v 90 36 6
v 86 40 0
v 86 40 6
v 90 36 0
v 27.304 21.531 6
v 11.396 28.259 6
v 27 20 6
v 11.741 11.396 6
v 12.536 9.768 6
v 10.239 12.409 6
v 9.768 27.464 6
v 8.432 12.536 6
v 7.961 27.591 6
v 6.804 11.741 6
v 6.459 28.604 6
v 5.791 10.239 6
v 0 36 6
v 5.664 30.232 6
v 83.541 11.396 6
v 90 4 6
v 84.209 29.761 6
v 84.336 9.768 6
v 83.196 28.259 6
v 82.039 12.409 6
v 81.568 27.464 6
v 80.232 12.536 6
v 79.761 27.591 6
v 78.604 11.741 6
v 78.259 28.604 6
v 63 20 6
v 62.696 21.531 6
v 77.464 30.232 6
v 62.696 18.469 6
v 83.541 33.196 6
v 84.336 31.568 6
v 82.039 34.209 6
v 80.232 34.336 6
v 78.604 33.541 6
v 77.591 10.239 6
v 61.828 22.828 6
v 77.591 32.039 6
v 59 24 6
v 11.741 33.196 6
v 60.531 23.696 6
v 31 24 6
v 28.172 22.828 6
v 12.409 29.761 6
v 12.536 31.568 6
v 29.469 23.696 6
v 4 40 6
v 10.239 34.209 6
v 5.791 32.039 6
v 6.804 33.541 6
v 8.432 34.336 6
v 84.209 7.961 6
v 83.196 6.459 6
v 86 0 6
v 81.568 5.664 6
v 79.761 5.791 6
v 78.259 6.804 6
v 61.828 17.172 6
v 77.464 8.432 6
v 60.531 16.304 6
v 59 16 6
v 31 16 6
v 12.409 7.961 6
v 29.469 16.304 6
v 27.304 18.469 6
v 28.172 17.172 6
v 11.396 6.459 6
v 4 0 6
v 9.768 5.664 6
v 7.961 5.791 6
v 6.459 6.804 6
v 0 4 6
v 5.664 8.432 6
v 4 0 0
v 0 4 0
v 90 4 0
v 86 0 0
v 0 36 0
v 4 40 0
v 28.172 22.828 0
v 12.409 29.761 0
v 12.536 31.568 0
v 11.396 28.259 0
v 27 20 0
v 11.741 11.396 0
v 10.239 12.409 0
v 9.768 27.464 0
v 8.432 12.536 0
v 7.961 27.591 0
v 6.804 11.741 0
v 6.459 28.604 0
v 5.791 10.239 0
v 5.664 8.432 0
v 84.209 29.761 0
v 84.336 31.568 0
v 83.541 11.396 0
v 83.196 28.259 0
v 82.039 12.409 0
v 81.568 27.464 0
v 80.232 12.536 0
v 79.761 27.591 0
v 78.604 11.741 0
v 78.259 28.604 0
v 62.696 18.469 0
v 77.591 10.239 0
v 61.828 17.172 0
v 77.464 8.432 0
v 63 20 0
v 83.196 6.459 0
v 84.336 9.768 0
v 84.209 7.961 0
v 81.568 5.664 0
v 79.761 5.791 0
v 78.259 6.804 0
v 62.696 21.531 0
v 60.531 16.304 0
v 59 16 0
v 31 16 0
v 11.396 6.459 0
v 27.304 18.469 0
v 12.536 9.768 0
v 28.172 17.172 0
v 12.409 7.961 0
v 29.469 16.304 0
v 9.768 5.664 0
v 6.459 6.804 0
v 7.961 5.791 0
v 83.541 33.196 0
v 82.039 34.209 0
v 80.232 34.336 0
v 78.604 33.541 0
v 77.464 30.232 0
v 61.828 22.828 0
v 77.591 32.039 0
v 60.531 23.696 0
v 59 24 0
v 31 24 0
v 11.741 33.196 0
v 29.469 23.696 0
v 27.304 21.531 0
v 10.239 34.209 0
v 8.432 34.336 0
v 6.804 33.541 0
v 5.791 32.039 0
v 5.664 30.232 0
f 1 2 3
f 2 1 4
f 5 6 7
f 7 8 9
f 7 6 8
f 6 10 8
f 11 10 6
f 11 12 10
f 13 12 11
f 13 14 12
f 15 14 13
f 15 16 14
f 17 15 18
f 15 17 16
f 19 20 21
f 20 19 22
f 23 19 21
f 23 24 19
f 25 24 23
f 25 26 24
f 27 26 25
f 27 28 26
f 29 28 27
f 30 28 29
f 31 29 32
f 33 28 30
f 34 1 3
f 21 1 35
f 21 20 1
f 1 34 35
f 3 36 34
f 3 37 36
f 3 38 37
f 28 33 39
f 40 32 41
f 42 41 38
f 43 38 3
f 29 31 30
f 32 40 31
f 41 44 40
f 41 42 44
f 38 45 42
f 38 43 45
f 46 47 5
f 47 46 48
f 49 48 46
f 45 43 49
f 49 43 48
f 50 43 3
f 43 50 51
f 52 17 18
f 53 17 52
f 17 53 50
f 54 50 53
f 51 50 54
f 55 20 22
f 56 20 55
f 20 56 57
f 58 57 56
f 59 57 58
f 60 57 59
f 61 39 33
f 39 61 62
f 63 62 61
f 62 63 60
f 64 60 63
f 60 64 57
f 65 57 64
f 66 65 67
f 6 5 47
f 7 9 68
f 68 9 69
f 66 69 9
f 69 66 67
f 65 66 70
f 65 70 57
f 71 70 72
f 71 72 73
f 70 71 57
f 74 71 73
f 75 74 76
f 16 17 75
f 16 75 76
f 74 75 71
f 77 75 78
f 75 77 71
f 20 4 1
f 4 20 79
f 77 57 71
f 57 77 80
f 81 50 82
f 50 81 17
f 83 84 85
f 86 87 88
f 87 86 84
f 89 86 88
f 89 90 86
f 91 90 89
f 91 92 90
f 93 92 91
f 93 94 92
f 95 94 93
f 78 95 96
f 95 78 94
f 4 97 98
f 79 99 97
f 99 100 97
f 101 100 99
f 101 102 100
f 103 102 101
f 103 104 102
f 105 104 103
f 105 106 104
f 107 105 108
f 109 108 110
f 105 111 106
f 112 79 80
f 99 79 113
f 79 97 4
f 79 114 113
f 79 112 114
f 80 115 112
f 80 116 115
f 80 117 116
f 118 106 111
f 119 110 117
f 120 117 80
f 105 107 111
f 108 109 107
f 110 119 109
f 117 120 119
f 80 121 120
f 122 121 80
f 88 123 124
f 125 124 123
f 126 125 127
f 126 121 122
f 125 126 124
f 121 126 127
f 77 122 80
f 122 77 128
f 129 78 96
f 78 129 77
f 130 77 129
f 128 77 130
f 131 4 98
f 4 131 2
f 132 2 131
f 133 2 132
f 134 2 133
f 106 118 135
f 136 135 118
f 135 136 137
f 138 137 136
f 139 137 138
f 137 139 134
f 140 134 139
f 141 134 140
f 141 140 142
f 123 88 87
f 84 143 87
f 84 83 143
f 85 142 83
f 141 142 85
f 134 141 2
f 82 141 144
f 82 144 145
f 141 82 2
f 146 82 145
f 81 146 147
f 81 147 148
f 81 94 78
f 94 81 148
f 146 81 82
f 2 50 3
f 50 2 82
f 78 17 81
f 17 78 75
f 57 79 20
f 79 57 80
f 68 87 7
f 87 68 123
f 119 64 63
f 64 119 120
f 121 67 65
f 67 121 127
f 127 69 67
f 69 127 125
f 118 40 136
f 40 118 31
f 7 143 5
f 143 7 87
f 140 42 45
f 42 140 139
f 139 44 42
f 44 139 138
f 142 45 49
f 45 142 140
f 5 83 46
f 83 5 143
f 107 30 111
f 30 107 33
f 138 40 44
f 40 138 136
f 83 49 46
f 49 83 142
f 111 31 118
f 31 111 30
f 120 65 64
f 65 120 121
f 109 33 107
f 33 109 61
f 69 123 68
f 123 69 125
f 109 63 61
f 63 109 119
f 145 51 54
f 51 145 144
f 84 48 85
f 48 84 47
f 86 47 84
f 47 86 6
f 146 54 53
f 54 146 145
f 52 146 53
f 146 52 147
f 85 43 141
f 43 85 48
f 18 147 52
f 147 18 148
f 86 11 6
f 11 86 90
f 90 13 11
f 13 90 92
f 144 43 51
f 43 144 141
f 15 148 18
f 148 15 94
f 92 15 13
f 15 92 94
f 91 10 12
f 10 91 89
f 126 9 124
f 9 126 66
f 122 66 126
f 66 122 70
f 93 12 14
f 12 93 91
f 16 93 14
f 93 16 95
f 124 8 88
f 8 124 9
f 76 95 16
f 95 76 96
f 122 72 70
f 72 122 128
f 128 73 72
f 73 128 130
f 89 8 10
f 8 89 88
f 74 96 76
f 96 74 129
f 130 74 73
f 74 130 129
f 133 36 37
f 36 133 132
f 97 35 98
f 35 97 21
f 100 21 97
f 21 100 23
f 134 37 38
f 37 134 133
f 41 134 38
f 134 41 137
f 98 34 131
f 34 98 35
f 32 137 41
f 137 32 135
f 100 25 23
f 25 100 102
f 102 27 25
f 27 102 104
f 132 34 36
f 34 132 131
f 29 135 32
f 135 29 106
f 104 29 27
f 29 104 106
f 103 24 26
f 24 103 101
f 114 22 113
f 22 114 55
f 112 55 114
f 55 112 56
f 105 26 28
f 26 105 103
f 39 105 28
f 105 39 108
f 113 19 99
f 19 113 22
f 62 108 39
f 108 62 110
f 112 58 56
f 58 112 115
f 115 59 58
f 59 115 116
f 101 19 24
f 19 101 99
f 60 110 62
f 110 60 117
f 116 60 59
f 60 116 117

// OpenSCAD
$fn = 32;

// ----------------------------------------------------------------------
// Bracket plate: slot plate 90 x 40
// ----------------------------------------------------------------------

// --- parameters (mm) ---
hole_r = 3.5;             // bolt hole radius
plate_t = 6;              // plate thickness, Z (extrusion height)
plate_l = 90;             // plate length
plate_w = 40;             // plate width
slot_l = 28;              // slot straight length
slot_r = 4;               // slot end radius

slot_len = slot_l + 2 * slot_r;
slot_w = 2 * slot_r;
hole_d2 = 2 * hole_r;

profile = [[4, 0], [86, 0], [90, 4], [90, 36], [86, 40], [4, 40], [0, 36], [0, 4]];  // primary outline, 8 points, counter clockwise
void_1 = [[59, 16], [60.531, 16.304], [61.828, 17.172], [62.696, 18.469], [63, 20], [62.696, 21.531], [61.828, 22.828], [60.531, 23.696], [59, 24], [31, 24], [29.469, 23.696], [28.172, 22.828], [27.304, 21.531], [27, 20], [27.304, 18.469], [28.172, 17.172], [29.469, 16.304], [31, 16]];  // grip slot, 18 points
void_2 = [[12.536, 31.568], [11.741, 33.196], [10.239, 34.209], [8.432, 34.336], [6.804, 33.541], [5.791, 32.039], [5.664, 30.232], [6.459, 28.604], [7.961, 27.591], [9.768, 27.464], [11.396, 28.259], [12.409, 29.761]];  // corner hole, 12 points
void_3 = [[12.536, 9.768], [11.741, 11.396], [10.239, 12.409], [8.432, 12.536], [6.804, 11.741], [5.791, 10.239], [5.664, 8.432], [6.459, 6.804], [7.961, 5.791], [9.768, 5.664], [11.396, 6.459], [12.409, 7.961]];  // corner hole, 12 points
void_4 = [[84.336, 31.568], [83.541, 33.196], [82.039, 34.209], [80.232, 34.336], [78.604, 33.541], [77.591, 32.039], [77.464, 30.232], [78.259, 28.604], [79.761, 27.591], [81.568, 27.464], [83.196, 28.259], [84.209, 29.761]];  // corner hole, 12 points
void_5 = [[84.336, 9.768], [83.541, 11.396], [82.039, 12.409], [80.232, 12.536], [78.604, 11.741], [77.591, 10.239], [77.464, 8.432], [78.259, 6.804], [79.761, 5.791], [81.568, 5.664], [83.196, 6.459], [84.209, 7.961]];  // corner hole, 12 points

// --- the one profile operation ---
difference() {
  linear_extrude(height = plate_t) polygon(points = profile);
  translate([0, 0, -1])
    linear_extrude(height = plate_t + 2) polygon(points = void_1);
  translate([0, 0, -1])
    linear_extrude(height = plate_t + 2) polygon(points = void_2);
  translate([0, 0, -1])
    linear_extrude(height = plate_t + 2) polygon(points = void_3);
  translate([0, 0, -1])
    linear_extrude(height = plate_t + 2) polygon(points = void_4);
  translate([0, 0, -1])
    linear_extrude(height = plate_t + 2) polygon(points = void_5);
}
